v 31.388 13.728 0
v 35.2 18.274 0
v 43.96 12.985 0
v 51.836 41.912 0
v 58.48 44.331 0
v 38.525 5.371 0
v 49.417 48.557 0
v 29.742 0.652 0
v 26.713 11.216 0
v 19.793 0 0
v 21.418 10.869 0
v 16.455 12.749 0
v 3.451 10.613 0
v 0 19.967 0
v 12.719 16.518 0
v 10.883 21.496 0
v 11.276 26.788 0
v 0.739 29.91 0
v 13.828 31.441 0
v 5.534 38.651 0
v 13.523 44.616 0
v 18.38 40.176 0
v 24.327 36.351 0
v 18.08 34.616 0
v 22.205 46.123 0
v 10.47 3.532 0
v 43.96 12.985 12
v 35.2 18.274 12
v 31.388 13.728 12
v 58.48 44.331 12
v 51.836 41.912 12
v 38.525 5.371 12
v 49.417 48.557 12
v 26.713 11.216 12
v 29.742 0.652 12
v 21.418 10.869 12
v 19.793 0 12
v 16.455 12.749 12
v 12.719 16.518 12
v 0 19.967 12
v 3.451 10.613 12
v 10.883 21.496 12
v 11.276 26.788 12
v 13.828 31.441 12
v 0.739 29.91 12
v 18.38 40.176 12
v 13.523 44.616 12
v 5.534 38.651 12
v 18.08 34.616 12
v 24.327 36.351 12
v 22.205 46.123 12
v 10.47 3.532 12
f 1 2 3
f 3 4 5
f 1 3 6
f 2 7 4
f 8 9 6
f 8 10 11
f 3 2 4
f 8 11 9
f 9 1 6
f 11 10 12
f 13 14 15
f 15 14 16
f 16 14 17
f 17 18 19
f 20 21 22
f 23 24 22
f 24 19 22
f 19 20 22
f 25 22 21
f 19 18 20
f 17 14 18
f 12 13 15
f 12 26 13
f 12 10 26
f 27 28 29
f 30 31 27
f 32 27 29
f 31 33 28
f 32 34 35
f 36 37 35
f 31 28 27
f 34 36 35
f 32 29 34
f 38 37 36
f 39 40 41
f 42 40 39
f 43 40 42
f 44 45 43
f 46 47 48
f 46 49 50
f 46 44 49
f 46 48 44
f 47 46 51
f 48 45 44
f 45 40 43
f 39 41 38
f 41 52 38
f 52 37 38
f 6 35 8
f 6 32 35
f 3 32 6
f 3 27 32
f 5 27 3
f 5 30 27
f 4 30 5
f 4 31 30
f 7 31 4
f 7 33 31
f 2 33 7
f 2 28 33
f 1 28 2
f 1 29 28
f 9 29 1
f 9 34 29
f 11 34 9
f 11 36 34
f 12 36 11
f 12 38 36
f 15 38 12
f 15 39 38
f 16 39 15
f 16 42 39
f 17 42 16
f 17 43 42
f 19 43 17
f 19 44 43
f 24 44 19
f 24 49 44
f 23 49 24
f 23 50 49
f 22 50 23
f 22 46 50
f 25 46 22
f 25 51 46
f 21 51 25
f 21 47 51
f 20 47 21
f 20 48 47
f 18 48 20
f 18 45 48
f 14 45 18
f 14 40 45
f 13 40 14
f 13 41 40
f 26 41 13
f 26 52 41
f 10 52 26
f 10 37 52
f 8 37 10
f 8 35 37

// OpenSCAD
$fn = 32;

// ----------------------------------------------------------------------
// Hook plate: curl radius 18 mm over 245 degrees, 10 mm thick band
// ----------------------------------------------------------------------

// --- parameters (mm) ---
profile_height = 12;      // extrusion height
profile_points = 26;      // points of the closed outline

profile = [[18.38, 40.176], [22.205, 46.123], [13.523, 44.616], [5.534, 38.651], [0.739, 29.91], [0, 19.967], [3.451, 10.613], [10.47, 3.532], [19.793, 0], [29.742, 0.652], [38.525, 5.371], [43.96, 12.985], [58.48, 44.331], [51.836, 41.912], [49.417, 48.557], [35.2, 18.274], [31.388, 13.728], [26.713, 11.216], [21.418, 10.869], [16.455, 12.749], [12.719, 16.518], [10.883, 21.496], [11.276, 26.788], [13.828, 31.441], [18.08, 34.616], [24.327, 36.351]];  // single closed polygon, 26 points, counter clockwise

// --- the one profile operation ---
linear_extrude(height = profile_height) polygon(points = profile);
